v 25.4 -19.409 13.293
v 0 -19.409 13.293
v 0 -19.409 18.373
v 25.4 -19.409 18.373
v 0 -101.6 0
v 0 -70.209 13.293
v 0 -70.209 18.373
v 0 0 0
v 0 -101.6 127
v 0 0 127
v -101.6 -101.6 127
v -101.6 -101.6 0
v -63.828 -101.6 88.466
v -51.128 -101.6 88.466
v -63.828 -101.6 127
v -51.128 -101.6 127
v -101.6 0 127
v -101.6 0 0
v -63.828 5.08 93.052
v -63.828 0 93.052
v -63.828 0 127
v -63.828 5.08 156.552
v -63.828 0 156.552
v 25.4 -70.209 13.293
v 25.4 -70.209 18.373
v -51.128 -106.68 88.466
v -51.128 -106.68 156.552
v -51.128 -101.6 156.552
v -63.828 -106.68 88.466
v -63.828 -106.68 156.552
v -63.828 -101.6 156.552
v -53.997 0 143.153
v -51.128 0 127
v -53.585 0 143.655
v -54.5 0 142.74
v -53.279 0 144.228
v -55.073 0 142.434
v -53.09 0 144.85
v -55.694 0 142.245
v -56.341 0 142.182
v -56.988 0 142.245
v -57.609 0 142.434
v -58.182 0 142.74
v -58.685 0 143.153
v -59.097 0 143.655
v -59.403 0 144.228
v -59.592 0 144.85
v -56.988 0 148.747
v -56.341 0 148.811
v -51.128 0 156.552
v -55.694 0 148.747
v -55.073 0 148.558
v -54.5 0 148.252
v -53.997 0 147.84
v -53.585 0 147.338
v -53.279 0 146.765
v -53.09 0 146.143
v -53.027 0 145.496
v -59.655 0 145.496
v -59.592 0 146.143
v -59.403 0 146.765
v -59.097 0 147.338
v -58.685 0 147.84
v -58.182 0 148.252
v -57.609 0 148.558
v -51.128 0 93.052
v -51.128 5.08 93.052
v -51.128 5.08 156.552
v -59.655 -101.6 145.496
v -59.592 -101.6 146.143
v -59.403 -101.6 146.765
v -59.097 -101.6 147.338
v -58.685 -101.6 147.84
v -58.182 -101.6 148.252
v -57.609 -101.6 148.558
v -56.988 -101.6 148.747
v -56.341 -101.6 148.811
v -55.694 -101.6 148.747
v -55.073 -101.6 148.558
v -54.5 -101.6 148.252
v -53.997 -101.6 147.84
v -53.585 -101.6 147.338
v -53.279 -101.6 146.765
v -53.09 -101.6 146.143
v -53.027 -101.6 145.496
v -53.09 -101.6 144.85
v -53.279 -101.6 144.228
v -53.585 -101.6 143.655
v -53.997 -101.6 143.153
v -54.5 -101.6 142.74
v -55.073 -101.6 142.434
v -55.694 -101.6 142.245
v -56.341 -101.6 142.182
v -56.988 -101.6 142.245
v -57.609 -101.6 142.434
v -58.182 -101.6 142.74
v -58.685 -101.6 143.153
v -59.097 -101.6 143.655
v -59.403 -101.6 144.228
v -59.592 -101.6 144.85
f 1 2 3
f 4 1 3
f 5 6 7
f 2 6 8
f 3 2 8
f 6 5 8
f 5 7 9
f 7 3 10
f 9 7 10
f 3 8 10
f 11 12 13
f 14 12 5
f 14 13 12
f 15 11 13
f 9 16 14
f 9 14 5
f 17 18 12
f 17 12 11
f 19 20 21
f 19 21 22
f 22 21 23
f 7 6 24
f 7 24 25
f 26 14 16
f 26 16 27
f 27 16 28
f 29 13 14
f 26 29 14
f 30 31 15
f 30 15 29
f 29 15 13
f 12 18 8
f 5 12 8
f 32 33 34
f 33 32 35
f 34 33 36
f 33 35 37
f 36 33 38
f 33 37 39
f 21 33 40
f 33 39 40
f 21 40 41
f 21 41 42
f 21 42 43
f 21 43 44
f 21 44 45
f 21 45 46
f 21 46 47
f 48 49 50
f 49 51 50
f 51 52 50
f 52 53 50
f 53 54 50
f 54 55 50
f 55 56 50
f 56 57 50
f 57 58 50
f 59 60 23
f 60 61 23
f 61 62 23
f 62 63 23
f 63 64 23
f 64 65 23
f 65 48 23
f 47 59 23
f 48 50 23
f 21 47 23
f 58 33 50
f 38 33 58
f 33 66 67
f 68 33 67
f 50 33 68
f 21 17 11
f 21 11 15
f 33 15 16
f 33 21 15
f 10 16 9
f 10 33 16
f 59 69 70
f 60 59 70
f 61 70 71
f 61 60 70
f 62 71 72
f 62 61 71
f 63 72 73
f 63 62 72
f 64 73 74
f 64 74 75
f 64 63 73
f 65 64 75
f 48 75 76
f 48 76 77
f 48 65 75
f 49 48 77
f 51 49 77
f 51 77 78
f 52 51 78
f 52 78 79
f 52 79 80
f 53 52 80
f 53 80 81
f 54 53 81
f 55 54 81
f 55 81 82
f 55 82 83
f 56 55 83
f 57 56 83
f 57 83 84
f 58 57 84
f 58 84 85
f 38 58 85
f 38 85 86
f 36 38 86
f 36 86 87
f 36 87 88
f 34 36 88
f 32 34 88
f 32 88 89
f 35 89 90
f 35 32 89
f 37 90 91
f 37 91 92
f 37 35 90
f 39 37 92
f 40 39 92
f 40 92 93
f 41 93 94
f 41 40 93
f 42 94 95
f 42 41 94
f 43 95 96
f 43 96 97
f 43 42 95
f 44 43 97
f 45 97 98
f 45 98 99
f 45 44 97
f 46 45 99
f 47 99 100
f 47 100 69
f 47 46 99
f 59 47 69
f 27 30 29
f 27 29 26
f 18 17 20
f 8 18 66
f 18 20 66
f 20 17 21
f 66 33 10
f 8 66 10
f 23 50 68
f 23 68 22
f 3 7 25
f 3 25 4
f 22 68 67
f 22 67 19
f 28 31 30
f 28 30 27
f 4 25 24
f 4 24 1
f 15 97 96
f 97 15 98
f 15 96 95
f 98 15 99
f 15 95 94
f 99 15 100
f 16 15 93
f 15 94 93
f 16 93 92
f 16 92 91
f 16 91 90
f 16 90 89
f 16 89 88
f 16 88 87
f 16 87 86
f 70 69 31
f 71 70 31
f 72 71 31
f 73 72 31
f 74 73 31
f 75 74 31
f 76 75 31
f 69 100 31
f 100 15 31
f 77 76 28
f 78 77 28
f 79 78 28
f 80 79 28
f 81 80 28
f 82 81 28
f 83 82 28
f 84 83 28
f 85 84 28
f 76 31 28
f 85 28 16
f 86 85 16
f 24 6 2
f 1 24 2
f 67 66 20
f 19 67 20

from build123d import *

# Parameters (mm, degrees)
F0_W     = 101.6
F0_H     = 127
F1_DEPTH = 101.6
F2_W     = 50.8
F2_H     = 5.08
F3_DEPTH = 25.4
F4_W     = 12.7
F4_H     = 29.5519137372
F4_H_2   = 38.5342074425
F5_DEPTH = 5.08
F6_W     = 12.7
F6_H     = 63.5
F7_DEPTH = 5.08
F8_R     = 3.3143898489
F9_DEPTH = 109.22


with BuildPart() as f1:
    # F0 (on Front) → F1 (new body)
    with BuildSketch(Plane.XZ):
        with Locations((-50.8, 63.5)):
            Rectangle(F0_W, F0_H)
    extrude(amount=F1_DEPTH)

    # F2 (on face) → F3 (join)
    with BuildSketch(Plane.YZ):
        with Locations((-44.8094035365, 15.8326673792)):
            Rectangle(F2_W, F2_H)
    extrude(amount=F3_DEPTH)

    # F4 (on face) → F5 (join)
    with BuildSketch(Plane.XZ.offset(101.6)):
        with Locations((-57.4776338577, 141.7759568686)):
            Rectangle(F4_W, F4_H)
        with Locations((-57.4776338577, 107.7328962787)):
            Rectangle(F4_W, F4_H_2)
    extrude(amount=F5_DEPTH)

    # F6 (on face) → F7 (join)
    with BuildSketch(Plane(origin=(0, 0, 0), x_dir=(-1, 0, 0), z_dir=(0, 1, 0))):
        with Locations((57.4776338577, 124.8019137372)):
            Rectangle(F6_W, F6_H)
    extrude(amount=F7_DEPTH)

    # F8 (on face) → F9 (join)
    with BuildSketch(Plane(origin=(0, 5.08, 0), x_dir=(-1, 0, 0), z_dir=(0, 1, 0))):
        with Locations((56.3409850001, 145.4961895943)):
            Circle(F8_R)
    extrude(amount=-F9_DEPTH)


solid = f1.part
